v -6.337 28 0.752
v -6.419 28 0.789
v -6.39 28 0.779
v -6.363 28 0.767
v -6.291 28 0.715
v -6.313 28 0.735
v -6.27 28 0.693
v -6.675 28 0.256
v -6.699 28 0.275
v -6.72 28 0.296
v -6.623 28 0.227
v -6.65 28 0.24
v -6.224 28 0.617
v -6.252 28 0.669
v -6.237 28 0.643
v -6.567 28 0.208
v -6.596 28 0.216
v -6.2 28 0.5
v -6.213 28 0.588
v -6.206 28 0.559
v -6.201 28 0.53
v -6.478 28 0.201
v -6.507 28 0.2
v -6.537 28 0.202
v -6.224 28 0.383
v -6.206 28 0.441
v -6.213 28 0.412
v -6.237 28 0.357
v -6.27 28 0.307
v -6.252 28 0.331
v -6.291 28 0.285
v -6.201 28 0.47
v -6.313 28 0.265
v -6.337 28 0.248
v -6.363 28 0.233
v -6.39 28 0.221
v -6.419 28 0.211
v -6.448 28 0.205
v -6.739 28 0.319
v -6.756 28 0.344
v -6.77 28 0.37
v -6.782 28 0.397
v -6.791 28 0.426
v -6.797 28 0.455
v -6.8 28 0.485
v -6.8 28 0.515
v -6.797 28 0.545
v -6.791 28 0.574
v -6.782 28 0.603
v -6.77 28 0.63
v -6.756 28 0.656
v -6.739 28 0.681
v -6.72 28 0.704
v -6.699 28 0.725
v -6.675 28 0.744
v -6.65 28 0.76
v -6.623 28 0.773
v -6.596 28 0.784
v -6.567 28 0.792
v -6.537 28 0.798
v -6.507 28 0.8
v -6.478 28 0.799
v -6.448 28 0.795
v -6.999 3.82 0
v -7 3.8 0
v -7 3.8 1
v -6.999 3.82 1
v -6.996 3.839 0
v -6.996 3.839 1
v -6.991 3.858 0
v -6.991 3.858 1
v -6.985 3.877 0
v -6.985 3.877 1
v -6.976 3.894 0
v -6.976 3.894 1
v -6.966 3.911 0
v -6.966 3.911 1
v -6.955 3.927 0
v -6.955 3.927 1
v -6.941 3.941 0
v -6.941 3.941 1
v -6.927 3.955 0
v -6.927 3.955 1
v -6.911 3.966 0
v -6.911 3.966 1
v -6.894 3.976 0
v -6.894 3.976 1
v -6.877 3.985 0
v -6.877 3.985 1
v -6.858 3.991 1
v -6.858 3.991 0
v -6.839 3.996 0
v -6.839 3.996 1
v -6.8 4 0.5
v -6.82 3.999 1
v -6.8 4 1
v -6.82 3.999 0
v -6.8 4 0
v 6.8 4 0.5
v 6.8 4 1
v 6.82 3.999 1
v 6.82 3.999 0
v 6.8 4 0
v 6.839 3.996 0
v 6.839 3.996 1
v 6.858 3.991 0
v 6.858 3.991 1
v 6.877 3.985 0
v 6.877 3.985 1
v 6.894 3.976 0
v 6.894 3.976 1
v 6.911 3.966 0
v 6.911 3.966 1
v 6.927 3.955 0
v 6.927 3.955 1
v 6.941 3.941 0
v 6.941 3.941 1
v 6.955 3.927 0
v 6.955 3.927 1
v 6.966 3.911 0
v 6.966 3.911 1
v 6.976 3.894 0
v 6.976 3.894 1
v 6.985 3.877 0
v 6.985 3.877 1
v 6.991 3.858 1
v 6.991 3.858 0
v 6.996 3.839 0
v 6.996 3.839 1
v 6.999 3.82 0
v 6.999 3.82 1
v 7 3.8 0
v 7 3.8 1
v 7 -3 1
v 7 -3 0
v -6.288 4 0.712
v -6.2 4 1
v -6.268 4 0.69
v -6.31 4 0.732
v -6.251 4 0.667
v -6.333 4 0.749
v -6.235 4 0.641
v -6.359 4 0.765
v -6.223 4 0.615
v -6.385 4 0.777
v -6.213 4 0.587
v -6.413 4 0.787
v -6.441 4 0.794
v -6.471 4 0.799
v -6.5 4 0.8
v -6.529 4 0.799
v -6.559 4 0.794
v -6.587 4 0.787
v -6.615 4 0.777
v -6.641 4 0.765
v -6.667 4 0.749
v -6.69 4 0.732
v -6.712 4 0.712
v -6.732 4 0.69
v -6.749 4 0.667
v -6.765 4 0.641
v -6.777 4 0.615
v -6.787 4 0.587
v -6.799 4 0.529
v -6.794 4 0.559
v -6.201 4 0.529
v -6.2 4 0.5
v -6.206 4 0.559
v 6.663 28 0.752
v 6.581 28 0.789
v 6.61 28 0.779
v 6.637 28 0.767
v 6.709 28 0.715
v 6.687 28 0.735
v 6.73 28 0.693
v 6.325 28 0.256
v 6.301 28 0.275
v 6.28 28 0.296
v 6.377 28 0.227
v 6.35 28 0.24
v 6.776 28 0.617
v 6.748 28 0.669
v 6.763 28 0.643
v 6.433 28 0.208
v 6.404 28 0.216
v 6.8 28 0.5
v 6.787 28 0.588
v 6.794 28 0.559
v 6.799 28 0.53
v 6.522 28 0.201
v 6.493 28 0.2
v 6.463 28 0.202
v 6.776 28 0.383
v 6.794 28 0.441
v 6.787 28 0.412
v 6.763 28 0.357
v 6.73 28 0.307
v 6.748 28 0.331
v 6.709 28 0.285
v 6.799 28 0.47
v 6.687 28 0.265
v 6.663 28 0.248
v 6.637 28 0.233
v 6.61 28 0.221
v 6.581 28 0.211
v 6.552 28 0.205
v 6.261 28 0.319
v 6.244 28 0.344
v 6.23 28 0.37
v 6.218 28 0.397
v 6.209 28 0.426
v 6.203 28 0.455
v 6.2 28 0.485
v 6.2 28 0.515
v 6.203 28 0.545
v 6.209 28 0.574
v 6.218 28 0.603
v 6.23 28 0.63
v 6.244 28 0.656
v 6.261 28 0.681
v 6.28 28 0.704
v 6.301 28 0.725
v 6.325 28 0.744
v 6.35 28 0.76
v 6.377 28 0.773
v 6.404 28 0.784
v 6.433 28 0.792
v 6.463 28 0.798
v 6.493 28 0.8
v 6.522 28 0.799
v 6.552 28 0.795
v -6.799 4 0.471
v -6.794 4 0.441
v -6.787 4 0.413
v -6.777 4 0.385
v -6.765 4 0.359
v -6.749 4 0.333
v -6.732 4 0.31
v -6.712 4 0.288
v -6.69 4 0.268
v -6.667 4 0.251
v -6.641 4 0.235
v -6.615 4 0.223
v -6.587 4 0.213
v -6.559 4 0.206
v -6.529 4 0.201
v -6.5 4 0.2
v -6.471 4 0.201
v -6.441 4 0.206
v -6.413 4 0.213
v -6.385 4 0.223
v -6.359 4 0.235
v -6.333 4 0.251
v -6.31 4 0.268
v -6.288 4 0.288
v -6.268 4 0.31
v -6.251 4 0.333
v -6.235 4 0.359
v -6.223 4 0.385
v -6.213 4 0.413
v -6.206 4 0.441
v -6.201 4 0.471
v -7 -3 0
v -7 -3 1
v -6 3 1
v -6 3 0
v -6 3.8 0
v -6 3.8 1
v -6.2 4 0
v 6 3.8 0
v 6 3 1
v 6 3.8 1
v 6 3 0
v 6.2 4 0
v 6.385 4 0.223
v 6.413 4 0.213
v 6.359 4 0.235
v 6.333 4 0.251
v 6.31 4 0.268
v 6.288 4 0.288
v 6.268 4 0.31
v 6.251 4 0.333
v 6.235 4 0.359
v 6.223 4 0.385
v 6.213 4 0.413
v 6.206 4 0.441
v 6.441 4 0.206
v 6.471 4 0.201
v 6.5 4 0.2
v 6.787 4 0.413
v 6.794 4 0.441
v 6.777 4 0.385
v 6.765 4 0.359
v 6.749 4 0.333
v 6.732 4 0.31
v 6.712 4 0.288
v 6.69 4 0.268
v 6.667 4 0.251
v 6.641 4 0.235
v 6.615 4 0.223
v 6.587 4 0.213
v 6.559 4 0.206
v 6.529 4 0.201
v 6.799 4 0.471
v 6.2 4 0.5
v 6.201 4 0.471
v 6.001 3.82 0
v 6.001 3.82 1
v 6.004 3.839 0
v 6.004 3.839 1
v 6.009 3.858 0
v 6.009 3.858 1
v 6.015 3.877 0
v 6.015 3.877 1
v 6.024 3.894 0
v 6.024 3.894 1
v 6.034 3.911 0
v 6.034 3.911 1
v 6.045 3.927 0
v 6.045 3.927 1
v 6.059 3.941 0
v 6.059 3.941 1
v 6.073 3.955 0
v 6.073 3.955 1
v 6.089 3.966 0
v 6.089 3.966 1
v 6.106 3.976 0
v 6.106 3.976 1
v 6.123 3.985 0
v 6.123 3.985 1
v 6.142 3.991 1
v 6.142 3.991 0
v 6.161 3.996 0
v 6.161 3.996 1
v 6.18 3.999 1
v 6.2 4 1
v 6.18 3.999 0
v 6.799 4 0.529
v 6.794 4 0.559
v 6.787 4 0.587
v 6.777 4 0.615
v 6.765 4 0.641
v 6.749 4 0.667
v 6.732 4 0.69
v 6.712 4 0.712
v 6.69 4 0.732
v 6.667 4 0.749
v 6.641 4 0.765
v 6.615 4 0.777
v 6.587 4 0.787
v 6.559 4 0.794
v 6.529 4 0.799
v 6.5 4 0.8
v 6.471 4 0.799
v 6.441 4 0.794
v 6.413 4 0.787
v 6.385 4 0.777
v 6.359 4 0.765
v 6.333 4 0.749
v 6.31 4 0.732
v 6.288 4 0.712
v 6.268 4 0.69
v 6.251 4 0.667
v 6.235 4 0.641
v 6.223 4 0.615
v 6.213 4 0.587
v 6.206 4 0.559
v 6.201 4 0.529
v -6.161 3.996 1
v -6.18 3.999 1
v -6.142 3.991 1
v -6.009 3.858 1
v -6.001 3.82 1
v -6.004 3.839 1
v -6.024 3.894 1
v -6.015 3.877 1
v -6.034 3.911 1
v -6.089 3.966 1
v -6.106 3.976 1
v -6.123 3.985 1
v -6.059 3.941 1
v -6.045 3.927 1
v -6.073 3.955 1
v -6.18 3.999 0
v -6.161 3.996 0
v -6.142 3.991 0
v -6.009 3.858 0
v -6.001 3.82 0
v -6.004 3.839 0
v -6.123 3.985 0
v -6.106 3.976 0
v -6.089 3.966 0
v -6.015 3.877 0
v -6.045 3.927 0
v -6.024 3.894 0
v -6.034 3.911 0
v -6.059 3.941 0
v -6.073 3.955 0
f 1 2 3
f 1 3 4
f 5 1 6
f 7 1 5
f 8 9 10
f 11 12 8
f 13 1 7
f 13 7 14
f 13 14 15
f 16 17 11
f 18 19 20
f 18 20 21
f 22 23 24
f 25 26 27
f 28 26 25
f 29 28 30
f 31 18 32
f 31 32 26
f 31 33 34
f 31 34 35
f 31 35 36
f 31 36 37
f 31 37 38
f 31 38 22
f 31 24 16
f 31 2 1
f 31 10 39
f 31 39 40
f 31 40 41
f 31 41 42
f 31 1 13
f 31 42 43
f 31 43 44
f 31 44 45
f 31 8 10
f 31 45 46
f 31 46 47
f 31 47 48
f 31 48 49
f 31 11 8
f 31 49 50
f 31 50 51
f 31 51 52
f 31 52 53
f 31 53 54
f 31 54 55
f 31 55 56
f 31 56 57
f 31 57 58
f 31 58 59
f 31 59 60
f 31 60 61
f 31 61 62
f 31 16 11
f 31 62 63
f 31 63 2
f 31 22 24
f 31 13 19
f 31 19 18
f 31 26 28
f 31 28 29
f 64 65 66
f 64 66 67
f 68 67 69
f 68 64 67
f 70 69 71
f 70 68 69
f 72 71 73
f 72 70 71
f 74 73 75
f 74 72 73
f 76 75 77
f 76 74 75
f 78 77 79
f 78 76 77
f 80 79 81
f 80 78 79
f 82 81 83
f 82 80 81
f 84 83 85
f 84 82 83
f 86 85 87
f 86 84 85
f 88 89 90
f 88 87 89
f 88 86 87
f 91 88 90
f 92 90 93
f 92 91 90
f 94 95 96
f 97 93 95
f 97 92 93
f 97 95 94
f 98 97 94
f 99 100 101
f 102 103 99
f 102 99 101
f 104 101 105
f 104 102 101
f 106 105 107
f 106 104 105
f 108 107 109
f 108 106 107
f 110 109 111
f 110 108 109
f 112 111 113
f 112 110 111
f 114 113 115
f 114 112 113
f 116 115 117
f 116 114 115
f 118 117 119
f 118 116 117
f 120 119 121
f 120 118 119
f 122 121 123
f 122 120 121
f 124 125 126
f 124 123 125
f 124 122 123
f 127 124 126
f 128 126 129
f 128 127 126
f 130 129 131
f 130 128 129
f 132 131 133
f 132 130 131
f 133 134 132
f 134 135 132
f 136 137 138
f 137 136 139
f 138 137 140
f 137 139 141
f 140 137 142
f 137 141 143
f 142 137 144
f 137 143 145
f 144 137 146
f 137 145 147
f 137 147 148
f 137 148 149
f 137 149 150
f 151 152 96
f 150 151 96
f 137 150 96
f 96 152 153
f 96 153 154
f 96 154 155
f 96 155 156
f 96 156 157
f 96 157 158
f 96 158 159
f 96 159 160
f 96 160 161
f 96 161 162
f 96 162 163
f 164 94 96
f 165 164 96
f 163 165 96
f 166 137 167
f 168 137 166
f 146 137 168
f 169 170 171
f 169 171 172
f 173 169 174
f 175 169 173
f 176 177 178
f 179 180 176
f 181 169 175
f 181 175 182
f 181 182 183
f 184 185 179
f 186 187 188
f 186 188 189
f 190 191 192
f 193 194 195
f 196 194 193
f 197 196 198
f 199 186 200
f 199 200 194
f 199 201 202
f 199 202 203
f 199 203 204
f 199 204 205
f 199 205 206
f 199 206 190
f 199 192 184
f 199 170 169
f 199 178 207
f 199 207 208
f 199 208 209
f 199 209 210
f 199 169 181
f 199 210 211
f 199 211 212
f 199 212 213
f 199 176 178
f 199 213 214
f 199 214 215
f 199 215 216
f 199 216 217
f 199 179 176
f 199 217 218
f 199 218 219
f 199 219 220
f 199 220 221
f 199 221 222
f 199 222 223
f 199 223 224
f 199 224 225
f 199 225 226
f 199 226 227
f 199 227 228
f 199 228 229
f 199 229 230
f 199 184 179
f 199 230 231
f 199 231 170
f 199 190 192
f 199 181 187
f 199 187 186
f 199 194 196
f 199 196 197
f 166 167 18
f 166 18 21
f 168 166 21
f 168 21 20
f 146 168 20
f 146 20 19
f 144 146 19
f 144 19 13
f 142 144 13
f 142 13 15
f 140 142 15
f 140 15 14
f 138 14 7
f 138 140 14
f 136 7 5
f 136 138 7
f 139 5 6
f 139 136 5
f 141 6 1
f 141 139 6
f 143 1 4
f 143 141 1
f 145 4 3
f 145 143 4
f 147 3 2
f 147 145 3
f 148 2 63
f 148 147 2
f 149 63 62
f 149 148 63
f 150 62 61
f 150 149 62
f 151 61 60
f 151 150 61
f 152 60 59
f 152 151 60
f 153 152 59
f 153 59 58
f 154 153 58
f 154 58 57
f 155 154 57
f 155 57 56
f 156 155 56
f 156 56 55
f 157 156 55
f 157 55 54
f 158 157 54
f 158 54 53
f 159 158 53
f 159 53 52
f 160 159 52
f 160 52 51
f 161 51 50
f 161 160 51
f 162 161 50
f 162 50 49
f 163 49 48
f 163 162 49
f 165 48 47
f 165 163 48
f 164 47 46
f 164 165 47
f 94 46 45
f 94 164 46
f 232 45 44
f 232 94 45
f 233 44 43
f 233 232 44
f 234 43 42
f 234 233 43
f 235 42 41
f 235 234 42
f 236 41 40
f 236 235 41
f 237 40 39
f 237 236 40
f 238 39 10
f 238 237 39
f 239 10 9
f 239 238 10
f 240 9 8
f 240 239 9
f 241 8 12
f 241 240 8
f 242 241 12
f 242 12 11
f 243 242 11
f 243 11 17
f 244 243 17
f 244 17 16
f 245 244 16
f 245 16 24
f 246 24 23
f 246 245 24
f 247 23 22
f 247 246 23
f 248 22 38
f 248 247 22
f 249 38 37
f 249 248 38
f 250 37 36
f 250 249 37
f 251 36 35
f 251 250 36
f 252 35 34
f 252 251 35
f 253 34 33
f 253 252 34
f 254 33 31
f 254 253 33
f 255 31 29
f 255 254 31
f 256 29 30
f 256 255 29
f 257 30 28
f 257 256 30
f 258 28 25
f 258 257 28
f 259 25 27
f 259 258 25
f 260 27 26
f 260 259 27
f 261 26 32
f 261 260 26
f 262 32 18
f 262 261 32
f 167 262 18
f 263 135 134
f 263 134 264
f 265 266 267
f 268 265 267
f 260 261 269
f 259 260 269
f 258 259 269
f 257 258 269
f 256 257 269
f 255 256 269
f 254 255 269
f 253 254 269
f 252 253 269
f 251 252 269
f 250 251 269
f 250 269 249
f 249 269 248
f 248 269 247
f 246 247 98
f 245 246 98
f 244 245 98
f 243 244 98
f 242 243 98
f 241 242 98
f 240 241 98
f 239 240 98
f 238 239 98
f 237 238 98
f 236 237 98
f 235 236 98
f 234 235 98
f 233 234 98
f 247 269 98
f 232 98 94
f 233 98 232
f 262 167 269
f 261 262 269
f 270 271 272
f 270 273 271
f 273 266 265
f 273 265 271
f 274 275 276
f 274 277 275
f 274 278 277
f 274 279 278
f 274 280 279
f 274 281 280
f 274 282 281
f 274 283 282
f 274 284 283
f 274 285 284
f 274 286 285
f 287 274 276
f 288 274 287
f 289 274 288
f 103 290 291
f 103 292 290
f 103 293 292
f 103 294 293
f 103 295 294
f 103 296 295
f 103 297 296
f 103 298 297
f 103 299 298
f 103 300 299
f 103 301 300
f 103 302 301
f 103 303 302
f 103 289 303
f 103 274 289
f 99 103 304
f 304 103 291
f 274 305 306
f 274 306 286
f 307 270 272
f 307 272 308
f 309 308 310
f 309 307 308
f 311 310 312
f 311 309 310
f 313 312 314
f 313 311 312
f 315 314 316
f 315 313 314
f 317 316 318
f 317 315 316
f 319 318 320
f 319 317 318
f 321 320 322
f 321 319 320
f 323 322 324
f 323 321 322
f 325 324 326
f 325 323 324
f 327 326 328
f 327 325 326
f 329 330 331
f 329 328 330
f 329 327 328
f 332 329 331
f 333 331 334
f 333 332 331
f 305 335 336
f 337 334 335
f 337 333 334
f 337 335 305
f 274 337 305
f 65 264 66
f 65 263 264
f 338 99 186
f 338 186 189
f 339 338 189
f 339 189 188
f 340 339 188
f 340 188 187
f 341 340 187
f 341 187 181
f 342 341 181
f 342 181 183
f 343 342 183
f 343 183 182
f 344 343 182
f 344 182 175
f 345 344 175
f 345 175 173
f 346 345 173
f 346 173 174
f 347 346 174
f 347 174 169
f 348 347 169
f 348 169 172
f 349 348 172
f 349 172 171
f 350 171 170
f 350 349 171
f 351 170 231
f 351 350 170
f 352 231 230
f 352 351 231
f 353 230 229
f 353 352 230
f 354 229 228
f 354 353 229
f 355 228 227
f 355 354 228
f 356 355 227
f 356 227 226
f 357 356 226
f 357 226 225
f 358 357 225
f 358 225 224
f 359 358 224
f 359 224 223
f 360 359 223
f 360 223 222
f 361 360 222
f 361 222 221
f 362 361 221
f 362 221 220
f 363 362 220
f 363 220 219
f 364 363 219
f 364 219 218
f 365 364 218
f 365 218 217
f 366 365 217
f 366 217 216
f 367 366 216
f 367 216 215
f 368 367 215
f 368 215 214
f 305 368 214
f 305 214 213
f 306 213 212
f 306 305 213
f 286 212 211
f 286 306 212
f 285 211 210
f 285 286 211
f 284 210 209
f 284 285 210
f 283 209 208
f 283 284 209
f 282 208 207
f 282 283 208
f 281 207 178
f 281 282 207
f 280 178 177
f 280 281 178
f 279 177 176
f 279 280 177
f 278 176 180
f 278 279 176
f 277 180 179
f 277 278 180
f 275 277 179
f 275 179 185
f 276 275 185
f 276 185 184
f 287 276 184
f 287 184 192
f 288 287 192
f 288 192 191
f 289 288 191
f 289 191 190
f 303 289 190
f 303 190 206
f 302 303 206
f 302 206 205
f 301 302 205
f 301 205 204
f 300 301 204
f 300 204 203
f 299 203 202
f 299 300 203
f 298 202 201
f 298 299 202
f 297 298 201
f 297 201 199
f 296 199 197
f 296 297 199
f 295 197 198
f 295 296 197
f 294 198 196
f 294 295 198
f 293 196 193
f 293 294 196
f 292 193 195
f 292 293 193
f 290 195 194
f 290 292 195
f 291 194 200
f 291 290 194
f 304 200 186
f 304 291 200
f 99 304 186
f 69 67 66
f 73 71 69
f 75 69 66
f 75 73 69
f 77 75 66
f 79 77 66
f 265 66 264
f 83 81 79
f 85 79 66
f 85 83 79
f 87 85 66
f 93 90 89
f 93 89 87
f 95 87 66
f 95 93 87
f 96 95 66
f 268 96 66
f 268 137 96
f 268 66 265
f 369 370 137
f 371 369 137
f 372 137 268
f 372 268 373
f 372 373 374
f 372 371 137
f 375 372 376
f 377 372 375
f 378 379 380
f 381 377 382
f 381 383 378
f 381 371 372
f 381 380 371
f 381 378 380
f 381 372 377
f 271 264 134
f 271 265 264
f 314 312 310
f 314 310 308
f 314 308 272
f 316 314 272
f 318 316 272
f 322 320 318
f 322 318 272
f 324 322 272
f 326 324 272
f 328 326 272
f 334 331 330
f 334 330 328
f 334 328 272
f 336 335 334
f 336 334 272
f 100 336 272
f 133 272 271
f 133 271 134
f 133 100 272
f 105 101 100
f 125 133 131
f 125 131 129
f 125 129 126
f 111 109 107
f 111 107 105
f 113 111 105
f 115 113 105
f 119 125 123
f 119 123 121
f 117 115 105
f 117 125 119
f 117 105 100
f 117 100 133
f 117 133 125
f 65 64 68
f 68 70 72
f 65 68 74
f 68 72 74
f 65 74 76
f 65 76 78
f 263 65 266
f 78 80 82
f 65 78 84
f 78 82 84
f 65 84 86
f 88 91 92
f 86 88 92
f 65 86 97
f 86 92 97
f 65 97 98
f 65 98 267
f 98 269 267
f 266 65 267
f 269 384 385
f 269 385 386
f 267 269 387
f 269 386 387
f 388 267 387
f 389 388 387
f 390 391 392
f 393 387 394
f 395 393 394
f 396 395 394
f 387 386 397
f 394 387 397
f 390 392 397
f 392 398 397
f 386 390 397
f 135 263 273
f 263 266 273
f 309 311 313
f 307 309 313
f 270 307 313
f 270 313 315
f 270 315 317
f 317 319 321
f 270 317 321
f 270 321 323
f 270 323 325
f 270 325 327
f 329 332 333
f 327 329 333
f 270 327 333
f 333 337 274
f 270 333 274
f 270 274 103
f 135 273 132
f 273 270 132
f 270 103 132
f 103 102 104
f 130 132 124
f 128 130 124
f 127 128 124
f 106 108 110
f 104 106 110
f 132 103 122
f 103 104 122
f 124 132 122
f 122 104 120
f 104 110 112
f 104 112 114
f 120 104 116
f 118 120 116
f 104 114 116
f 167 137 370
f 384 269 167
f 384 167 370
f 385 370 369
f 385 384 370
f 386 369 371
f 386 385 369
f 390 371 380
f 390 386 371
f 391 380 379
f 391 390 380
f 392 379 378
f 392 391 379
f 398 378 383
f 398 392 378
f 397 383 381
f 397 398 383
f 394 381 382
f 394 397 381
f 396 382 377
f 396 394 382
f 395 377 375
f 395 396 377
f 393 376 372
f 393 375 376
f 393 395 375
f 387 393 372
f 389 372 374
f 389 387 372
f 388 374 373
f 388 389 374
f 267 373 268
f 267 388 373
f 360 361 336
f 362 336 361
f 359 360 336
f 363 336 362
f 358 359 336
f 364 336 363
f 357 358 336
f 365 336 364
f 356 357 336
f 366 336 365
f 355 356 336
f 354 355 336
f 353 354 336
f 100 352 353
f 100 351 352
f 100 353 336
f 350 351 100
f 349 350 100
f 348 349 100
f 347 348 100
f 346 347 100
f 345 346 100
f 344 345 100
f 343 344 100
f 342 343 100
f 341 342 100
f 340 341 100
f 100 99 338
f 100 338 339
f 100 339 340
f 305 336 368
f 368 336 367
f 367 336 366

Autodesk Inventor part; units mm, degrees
ref_plane "YZ Plane" through (0, 0, 0) normal (1, 0, 0) x (0, 1, 0)
ref_plane "XZ Plane" through (0, 0, 0) normal (0, 1, 0) x (-1, 0, 0)
ref_plane "XY Plane" through (0, 0, 0) normal (0, 0, 1) x (1, 0, 0)
sketch "Sketch2" plane through (0, 0, 0) normal (0, 0, 1) x (1, 0, 0)
  line L0 (7, -3) -> (7, 3)
  line L1 (7, -3) -> (-7, -3)
  line L2 (-7, -3) -> (-7, 3)
  line L3 (6, 3) -> (6, 3.8)
  line L4 (6.2, 4) -> (6.8, 4)
  line L5 (7, 3.8) -> (7, 3)
  line L6 (-6, 3) -> (-6, 3.8)
  line L7 (-6.2, 4) -> (-6.8, 4)
  line L8 (-7, 3.8) -> (-7, 3)
  line L9 (-6, 3) -> (6, 3)
  line L10 (7, 3) -> (7.3028, 3)
  line L11 (-7, 3) -> (-7.3058, 3)
  arc A0 (-6, 3.8) -> (-6.2, 4) centre (-6.2, 3.8) ccw
  arc A1 (-6.8, 4) -> (-7, 3.8) centre (-6.8, 3.8) ccw
  arc A2 (6.2, 4) -> (6, 3.8) centre (6.2, 3.8) ccw
  arc A3 (7, 3.8) -> (6.8, 4) centre (6.8, 3.8) ccw
  point P0 (0, 0)
  dimension "d5" = 14
  dimension "d6" = 6
extrude "Extrusion1" add sketch "Sketch2" along normal blind 1
sketch "Sketch3" plane through (-6.8, 4, 0) normal (0, 1, 0) x (1, 0, 0)
  circle A0 centre (0.3, -0.5) radius 0.3
  point P0 (6.8, 0)
  dimension "d9" = 0.6
sketch "Sketch4" plane through (6.2, 4, 0) normal (0, 1, 0) x (1, 0, 0)
  circle A0 centre (0.3, -0.5) radius 0.3
  point P0 (-6.2, 0)
  dimension "d10" = 0.6
extrude "Extrusion2" add sketch "Sketch4" along normal blind 24
extrude "Extrusion3" add sketch "Sketch3" along normal blind 24
equation "\"BendRadius\" = Thickness"
equation "\"BendReliefWidth\" = Thickness"
equation "\"BendReliefDepth\" = 0.5 * Thickness"
equation "\"CornerReliefSize\" = 4 * Thickness"
equation "\"MinimumRemnant\" = 2 * Thickness"
equation "\"TransitionRadius\" = BendRadius"
equation "\"JacobiRadiusSize\" = BendRadius"
equation "\"GapSize\" = Thickness"
equation "\"Thickness\" = 3.048"
properties part number "K71-6"
